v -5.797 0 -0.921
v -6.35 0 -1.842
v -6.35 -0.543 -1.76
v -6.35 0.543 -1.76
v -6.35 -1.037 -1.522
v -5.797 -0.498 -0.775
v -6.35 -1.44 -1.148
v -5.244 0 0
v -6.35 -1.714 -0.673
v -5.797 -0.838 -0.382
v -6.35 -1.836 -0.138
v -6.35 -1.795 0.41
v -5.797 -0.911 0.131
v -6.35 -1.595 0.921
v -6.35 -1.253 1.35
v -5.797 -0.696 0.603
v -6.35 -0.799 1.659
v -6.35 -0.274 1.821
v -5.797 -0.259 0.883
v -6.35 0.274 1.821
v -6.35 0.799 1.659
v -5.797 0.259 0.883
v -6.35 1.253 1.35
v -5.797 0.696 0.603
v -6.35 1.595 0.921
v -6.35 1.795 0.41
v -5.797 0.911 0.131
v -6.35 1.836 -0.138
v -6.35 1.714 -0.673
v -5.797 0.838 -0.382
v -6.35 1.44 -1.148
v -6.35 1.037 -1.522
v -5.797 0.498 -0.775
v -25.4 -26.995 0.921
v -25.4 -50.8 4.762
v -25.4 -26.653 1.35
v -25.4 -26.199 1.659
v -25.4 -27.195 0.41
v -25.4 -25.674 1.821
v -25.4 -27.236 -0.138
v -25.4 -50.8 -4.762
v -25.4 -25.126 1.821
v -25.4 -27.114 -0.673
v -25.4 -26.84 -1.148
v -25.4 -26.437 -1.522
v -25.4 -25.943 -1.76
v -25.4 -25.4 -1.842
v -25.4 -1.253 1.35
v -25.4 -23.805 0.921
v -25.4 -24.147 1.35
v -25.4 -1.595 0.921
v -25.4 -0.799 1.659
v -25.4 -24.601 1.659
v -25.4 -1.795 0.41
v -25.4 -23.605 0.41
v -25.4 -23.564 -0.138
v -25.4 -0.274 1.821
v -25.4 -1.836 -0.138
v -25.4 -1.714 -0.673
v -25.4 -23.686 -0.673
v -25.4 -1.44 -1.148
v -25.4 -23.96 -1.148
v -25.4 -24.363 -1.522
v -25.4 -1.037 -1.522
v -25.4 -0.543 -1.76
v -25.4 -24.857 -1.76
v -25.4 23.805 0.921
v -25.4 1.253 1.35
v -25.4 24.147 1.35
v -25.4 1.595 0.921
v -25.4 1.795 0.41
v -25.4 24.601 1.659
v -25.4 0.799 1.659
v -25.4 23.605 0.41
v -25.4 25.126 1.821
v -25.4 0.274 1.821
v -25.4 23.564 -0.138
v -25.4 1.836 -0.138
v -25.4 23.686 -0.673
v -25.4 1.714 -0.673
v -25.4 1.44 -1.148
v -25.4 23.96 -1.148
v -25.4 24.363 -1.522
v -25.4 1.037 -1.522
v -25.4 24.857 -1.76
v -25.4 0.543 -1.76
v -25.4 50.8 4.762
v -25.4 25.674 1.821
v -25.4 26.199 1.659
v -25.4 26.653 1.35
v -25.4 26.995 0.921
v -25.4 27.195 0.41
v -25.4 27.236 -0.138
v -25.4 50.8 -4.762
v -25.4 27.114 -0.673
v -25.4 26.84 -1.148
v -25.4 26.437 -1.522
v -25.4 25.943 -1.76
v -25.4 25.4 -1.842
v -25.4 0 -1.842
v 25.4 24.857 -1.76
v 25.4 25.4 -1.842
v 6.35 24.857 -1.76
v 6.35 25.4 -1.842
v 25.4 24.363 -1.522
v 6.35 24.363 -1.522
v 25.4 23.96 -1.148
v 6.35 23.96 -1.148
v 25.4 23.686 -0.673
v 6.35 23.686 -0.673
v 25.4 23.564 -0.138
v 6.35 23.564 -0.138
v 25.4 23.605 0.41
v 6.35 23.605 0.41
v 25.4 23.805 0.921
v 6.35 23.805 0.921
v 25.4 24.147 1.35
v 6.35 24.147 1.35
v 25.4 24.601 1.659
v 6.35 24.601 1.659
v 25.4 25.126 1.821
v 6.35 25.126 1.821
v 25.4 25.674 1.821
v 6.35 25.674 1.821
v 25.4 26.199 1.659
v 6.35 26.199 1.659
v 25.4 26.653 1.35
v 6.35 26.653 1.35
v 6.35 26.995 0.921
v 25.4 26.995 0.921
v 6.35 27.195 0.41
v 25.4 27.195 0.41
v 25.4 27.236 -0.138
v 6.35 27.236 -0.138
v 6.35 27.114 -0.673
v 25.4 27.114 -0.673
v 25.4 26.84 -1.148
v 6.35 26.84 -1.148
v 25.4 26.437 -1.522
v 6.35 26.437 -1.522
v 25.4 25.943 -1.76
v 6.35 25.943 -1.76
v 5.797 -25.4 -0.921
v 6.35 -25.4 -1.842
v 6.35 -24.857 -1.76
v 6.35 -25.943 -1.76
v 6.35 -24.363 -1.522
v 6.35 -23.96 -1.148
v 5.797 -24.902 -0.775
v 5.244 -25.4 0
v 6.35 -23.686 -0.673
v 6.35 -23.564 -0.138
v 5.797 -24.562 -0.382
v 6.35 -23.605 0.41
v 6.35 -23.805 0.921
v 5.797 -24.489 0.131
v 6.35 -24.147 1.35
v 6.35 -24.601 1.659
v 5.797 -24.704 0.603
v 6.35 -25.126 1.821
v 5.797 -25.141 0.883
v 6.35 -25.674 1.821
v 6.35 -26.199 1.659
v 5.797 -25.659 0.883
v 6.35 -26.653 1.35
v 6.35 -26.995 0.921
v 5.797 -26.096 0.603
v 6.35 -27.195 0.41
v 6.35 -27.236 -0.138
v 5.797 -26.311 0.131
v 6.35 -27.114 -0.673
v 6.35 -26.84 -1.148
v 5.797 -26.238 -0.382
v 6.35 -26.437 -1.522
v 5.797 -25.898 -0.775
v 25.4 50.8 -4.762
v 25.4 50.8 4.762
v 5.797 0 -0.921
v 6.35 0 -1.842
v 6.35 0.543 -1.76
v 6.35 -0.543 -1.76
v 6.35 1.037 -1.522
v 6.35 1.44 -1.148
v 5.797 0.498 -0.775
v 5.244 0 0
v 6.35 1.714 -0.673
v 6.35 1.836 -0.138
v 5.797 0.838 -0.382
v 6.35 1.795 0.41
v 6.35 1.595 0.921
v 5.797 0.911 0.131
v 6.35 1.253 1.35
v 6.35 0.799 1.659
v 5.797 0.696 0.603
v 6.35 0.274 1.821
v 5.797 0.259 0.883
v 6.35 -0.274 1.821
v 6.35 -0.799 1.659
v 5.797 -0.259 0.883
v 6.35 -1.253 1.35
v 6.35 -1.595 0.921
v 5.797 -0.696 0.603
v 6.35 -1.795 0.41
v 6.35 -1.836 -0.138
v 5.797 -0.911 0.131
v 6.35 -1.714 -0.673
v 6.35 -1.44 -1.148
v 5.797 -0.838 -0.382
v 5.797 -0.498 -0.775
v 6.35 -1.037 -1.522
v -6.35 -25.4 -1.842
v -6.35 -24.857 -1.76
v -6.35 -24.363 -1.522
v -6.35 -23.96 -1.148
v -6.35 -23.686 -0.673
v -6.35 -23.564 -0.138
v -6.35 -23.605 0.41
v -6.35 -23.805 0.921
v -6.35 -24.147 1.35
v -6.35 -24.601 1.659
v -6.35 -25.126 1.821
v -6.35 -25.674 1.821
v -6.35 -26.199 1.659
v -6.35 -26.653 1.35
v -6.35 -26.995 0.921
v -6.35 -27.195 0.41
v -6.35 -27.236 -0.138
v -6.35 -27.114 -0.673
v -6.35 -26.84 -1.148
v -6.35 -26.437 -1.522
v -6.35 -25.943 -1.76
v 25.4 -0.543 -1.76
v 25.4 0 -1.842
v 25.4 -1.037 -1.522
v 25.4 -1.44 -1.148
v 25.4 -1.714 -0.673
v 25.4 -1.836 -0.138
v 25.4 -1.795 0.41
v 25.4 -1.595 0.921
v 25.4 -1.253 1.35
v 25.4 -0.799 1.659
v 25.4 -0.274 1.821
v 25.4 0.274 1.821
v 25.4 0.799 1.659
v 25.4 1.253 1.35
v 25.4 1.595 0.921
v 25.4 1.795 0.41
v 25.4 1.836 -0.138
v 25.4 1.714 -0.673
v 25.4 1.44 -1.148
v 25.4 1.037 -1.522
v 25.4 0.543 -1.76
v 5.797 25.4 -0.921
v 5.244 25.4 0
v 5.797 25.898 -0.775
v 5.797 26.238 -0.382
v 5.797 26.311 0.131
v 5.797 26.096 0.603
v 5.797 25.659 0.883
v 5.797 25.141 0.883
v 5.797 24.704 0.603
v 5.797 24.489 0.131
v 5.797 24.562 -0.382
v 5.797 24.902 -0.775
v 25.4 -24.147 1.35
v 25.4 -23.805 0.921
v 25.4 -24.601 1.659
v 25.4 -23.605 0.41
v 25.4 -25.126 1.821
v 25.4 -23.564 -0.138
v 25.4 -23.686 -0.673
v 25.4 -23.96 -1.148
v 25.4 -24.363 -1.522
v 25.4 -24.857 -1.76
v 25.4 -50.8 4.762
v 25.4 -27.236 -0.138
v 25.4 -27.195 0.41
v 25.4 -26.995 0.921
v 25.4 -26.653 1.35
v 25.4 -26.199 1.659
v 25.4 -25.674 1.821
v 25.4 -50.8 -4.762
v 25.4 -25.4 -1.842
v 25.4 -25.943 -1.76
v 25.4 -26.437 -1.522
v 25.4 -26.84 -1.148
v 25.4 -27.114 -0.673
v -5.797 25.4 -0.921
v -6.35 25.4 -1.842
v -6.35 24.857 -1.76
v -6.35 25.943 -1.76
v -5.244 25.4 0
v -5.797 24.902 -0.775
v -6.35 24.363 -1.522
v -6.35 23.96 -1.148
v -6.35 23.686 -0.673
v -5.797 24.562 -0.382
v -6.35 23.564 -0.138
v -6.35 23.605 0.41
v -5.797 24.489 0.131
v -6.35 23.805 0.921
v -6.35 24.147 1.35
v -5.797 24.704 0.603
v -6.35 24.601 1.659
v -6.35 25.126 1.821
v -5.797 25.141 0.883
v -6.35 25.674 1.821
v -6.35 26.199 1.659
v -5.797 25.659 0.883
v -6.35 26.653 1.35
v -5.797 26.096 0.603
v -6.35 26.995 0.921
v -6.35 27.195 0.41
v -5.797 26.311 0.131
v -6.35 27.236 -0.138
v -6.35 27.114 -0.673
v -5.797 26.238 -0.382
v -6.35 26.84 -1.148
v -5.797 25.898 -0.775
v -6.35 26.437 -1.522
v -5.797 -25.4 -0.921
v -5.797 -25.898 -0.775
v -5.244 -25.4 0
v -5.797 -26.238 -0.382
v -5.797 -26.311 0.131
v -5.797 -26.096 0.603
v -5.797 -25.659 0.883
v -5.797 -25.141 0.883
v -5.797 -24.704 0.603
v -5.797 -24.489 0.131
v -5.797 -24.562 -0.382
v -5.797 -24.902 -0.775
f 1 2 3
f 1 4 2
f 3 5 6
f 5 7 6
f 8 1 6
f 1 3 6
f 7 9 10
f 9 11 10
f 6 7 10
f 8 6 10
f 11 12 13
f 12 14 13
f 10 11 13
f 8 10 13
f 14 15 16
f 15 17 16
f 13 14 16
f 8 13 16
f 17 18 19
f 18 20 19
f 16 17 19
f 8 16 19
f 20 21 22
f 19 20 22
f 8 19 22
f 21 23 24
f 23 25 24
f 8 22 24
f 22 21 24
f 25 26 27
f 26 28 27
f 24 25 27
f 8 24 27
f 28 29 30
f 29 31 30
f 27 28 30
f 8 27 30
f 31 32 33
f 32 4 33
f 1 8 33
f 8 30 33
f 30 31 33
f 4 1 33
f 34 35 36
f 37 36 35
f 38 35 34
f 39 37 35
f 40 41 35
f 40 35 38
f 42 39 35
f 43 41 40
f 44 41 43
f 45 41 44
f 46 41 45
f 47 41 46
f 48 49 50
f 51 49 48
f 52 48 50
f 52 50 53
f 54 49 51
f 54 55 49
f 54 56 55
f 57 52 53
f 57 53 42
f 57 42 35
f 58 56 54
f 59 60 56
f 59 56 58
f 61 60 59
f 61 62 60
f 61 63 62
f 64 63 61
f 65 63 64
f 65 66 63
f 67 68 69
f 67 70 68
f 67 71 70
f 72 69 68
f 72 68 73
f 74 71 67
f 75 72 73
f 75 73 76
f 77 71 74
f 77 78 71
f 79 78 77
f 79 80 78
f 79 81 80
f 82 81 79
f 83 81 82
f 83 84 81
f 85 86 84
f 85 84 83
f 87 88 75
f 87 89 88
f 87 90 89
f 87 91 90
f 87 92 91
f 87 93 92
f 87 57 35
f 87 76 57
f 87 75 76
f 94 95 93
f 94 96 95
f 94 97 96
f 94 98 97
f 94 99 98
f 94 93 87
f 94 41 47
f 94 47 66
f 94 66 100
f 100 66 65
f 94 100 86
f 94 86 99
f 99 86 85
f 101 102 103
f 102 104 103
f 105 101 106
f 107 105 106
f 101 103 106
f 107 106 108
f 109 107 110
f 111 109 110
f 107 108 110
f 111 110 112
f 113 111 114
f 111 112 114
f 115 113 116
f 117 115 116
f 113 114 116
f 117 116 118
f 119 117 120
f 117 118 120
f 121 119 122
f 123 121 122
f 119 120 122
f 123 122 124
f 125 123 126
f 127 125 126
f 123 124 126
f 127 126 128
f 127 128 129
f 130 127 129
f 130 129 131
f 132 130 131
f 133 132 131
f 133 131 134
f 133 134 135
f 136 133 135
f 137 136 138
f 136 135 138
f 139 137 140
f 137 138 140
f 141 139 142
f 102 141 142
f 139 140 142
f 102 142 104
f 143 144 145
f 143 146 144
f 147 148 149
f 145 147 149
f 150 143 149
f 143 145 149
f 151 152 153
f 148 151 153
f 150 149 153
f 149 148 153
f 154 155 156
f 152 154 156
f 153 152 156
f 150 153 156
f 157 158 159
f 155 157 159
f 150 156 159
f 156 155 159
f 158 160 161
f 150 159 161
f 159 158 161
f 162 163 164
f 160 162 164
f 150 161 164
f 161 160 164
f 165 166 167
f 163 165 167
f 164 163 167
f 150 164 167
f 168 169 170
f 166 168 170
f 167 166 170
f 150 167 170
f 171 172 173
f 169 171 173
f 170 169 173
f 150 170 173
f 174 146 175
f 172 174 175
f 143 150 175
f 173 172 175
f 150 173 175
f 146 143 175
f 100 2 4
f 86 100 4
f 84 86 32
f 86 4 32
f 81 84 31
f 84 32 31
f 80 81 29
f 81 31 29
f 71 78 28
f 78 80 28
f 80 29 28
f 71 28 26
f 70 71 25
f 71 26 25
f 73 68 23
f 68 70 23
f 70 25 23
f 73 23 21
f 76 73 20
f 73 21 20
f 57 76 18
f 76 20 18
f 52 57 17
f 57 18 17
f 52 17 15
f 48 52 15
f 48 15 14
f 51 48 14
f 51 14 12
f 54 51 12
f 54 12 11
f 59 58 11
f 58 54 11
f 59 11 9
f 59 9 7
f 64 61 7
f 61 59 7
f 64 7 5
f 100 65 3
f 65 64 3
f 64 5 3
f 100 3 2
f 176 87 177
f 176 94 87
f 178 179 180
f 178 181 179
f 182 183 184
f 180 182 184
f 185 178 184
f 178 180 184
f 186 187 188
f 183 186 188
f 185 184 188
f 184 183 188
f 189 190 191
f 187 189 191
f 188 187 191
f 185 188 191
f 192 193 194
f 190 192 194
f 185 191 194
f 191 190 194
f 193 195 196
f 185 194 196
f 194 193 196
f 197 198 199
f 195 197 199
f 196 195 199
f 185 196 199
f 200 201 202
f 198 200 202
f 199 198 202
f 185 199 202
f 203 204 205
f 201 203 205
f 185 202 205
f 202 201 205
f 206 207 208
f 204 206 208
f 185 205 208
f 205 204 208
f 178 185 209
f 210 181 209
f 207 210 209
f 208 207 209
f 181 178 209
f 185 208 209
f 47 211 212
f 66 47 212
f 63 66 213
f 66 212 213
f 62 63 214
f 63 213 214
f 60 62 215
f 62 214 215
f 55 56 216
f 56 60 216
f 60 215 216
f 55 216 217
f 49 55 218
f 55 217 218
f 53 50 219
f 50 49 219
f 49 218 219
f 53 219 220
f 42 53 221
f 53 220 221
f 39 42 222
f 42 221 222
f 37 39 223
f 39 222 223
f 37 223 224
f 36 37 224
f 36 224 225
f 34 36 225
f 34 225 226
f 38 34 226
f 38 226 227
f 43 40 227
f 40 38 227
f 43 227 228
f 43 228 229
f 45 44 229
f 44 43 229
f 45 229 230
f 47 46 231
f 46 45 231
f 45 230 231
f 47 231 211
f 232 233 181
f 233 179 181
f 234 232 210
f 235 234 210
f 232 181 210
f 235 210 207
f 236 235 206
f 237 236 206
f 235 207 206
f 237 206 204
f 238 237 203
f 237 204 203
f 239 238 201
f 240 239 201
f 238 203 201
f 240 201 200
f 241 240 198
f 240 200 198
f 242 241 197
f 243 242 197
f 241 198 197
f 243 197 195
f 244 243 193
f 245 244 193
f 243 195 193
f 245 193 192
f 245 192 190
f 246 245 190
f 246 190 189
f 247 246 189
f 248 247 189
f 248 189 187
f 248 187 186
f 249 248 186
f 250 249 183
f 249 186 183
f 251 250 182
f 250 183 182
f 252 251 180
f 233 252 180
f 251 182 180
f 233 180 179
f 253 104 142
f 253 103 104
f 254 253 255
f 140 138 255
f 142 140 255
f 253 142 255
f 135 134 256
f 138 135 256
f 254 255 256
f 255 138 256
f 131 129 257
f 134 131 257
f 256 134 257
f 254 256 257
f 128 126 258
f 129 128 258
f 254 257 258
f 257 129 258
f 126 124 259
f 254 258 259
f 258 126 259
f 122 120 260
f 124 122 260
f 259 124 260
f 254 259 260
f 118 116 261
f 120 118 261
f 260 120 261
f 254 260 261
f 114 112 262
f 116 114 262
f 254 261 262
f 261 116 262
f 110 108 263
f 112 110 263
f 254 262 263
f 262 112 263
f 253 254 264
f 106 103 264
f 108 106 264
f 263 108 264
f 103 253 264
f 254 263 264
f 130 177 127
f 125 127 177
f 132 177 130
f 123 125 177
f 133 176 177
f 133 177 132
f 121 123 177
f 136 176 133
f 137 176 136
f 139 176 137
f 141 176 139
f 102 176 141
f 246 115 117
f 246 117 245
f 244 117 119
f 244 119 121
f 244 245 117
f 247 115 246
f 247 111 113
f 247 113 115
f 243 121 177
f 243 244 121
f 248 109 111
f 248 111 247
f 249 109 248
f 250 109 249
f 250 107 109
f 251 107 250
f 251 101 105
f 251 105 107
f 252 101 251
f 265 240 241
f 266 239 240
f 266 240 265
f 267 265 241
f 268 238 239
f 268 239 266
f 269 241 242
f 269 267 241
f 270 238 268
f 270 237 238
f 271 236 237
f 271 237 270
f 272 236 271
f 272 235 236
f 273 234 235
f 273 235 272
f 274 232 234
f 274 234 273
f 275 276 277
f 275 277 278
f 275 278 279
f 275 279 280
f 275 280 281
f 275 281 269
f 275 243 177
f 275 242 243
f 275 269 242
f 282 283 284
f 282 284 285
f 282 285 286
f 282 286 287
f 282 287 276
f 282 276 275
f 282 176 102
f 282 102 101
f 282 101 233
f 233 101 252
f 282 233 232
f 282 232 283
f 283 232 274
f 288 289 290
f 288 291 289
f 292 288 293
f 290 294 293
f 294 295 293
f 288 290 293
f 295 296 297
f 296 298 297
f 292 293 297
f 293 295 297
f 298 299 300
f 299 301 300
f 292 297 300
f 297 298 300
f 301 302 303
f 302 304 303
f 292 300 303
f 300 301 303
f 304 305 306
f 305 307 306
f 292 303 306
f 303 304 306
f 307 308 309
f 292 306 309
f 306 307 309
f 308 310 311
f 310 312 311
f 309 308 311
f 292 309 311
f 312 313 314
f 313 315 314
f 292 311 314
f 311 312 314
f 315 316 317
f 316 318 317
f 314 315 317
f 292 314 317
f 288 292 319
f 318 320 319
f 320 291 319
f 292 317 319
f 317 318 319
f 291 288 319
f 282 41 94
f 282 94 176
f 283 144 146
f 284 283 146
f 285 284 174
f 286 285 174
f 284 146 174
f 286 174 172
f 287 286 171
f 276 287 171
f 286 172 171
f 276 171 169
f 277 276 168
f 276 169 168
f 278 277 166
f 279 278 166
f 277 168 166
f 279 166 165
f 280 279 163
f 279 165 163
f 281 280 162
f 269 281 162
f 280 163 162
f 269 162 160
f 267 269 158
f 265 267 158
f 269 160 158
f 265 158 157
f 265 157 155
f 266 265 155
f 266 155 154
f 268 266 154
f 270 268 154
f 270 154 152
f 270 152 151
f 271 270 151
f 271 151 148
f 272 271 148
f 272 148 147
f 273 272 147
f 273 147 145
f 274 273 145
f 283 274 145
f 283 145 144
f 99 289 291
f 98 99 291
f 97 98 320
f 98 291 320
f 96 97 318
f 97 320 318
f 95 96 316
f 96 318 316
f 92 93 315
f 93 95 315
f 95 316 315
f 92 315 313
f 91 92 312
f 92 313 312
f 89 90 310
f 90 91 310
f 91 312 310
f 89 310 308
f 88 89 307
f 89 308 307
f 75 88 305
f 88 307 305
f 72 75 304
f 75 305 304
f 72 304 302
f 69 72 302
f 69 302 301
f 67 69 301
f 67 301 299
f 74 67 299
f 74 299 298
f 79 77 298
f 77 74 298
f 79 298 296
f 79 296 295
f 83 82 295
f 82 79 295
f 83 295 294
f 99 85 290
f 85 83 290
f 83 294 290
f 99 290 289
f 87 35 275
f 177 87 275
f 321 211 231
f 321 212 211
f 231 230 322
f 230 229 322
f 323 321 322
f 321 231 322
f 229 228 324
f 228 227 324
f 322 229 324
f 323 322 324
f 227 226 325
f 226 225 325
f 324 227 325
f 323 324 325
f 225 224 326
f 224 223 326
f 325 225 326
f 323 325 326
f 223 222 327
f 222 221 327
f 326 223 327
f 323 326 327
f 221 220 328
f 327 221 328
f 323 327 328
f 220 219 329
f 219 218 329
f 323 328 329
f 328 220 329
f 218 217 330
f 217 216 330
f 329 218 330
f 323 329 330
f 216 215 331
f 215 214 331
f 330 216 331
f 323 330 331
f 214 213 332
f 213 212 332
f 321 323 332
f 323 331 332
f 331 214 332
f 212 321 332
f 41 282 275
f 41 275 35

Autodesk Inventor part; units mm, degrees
ref_plane "YZ Plane" through (0, 0, 0) normal (1, 0, 0) x (0, 1, 0)
ref_plane "XZ Plane" through (0, 0, 0) normal (0, 1, 0) x (-1, 0, 0)
ref_plane "XY Plane" through (0, 0, 0) normal (0, 0, 1) x (1, 0, 0)
sketch "Sketch1" plane through (0, 0, 0) normal (0, 0, 1) x (1, 0, 0)
  line L0 (-35.56, 0) -> (35.56, 0) projected
  line L1 (0, -71.12) -> (0, 71.12) projected
  line L2 (-25.4, 50.8) -> (25.4, 50.8)
  line L3 (25.4, 50.8) -> (25.4, -50.8)
  line L4 (25.4, -50.8) -> (-25.4, -50.8)
  line L5 (-25.4, -50.8) -> (-25.4, 50.8)
  point P0 (0, 0)
  point P1 (-25.4, 0)
  point P2 (0, 50.8)
  dimension "d0" = 101.6
  dimension "d1" = 50.8
extrude "Extrusion1" add sketch "Sketch1" along normal mid plane 9.525
sketch "Sketch2" plane through (25.4, -50.8, 4.7625) normal (1, 0, 0) x (0, 0, -1)
  point P0 (4.7625, 50.8)
  point P1 (4.7625, 76.2)
  point P2 (4.7625, 50.8)
  point P3 (4.7625, 25.4)
  dimension "d4" = 25.4
  dimension "d5" = 25.4
hole "Hole1" at (25.4, 25.4, 0) at (25.4, 0, 0) at (25.4, -25.4, 0) direction (-1, 0, 0) diameter 3.683 depth 19.05 tip angle 118 thread size "10-24 UNC" class "2B" standard "ANSI Unified Screw Threads"
mirror "Mirror1" about plane through (0, 0, 0) normal (1, 0, 0) of "Hole1"
properties part number "plate_connect_block"
